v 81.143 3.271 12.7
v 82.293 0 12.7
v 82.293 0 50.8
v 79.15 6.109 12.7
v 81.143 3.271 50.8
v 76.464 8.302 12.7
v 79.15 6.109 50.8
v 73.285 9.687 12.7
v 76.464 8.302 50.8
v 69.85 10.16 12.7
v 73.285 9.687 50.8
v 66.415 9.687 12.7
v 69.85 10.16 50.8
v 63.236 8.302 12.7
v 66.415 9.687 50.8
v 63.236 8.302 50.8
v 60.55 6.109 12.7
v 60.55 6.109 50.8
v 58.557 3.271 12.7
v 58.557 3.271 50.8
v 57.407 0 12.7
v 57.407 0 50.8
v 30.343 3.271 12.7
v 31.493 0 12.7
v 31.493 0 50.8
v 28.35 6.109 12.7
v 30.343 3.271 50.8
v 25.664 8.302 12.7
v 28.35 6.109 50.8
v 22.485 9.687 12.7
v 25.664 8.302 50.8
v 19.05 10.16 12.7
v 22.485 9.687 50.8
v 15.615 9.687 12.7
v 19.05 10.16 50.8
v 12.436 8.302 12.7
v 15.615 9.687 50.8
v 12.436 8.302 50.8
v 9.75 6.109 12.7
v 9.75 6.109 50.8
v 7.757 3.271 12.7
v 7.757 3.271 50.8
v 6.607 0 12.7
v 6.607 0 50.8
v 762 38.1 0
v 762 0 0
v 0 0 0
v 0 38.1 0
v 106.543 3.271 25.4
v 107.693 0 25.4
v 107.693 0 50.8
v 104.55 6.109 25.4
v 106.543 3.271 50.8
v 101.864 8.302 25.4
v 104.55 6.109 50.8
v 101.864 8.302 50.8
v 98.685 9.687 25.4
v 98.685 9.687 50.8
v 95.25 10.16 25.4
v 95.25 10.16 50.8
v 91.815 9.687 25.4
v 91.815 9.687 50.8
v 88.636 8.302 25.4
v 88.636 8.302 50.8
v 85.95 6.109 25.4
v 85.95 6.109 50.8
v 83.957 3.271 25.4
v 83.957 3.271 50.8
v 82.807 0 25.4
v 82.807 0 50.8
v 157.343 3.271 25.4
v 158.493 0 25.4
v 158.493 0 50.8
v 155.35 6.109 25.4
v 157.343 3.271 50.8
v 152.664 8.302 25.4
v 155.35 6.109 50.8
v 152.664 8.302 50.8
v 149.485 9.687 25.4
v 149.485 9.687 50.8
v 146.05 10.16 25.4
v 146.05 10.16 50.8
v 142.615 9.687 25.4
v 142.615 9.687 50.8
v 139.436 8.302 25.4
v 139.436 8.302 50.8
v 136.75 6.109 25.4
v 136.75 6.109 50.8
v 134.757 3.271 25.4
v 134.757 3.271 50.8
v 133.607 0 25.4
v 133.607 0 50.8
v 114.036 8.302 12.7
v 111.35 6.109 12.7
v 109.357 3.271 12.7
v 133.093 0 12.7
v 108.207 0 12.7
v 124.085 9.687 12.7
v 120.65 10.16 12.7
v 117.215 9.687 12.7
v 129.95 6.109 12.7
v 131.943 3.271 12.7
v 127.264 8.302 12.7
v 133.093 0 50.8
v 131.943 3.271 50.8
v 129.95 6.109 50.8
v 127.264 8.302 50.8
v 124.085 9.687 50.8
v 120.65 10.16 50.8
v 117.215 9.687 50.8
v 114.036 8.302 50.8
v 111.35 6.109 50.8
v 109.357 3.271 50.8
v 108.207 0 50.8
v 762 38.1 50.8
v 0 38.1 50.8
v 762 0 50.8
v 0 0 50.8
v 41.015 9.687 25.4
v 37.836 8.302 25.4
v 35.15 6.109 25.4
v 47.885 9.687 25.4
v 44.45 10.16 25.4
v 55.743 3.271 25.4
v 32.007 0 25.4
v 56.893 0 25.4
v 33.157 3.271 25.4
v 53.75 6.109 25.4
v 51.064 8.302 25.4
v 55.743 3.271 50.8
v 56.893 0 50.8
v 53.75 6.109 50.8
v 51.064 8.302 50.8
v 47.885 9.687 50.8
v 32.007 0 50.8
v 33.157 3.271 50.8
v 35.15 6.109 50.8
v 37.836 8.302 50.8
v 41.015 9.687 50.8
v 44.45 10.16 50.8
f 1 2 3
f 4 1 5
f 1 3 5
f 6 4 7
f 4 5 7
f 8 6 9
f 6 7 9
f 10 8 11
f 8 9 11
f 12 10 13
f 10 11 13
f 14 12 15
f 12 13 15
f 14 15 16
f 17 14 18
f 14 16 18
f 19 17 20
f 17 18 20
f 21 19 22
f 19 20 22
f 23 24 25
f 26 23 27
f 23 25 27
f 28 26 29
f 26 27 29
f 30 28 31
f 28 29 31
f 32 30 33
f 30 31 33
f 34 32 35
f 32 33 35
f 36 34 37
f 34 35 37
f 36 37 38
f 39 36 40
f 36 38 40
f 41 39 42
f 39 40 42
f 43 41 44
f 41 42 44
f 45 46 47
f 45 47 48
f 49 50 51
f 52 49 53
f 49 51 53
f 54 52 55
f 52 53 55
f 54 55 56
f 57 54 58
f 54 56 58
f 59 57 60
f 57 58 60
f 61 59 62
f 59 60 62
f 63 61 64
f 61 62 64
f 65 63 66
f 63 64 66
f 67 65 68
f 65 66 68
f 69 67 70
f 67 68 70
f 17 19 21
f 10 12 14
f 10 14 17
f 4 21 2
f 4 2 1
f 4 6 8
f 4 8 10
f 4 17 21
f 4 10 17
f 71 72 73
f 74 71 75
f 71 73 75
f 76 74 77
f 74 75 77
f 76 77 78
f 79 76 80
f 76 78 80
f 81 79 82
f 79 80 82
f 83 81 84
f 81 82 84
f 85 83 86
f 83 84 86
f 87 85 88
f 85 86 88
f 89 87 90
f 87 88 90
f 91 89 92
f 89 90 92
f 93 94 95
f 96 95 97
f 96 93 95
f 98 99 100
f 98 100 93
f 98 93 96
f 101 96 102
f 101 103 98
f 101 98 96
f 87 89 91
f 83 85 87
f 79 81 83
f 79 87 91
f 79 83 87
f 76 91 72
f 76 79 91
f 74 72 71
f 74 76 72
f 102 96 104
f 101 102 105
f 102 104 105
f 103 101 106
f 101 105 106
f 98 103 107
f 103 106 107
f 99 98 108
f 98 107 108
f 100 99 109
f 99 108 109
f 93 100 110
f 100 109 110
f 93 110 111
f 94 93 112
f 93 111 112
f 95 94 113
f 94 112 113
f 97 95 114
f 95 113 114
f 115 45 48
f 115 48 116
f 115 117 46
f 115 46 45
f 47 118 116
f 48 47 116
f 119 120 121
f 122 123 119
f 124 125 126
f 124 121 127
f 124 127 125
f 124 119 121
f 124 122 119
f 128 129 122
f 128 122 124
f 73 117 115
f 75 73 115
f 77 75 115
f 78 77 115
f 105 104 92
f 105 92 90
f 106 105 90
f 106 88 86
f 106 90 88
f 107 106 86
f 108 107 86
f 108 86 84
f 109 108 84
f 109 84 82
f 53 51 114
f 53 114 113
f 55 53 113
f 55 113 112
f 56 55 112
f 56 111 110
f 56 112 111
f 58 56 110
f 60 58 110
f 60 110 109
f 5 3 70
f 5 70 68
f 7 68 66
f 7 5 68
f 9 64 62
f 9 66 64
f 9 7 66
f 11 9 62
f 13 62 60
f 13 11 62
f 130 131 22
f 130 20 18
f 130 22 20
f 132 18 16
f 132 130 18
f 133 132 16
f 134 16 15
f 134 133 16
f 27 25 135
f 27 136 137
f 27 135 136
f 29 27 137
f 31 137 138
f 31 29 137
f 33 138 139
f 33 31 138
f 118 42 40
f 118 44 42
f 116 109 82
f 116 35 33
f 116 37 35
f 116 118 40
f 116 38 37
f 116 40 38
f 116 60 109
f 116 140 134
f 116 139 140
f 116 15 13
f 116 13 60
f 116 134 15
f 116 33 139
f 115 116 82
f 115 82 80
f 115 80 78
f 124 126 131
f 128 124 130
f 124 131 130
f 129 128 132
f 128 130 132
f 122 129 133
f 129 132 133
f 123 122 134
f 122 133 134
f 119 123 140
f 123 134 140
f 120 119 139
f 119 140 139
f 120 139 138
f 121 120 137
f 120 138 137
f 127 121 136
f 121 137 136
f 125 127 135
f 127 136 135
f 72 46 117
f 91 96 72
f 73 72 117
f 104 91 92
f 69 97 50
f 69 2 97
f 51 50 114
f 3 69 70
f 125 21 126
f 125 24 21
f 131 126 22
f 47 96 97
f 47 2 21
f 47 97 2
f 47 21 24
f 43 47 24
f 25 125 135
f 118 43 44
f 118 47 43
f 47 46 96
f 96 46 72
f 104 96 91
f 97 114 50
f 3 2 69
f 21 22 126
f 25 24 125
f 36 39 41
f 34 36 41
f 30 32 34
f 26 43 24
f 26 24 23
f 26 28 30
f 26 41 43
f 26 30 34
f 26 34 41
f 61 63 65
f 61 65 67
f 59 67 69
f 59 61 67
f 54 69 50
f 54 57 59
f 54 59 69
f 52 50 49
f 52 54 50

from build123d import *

# Parameters (mm, degrees)
F0_W     = 38.1
F0_H     = 50.8
F1_DEPTH = 762
F3_DEPTH = 38.1
F5_DEPTH = 25.4


with BuildPart() as f1:
    # F0 (on Right) → F1 (new body)
    with BuildSketch(Plane.YZ):
        with Locations((19.05, 25.4)):
            Rectangle(F0_W, F0_H)
    extrude(amount=F1_DEPTH)

    # F2 (on face) → F3 (cut)
    with BuildSketch(Plane.XY.offset(50.8)):
        with BuildLine():
            ThreePointArc((6.35, -2.54), (19.05, -15.24), (31.75, -2.54))
            ThreePointArc((31.75, -2.54), (19.05, 10.16), (6.35, -2.54))
        make_face()
        with BuildLine():
            ThreePointArc((57.15, -2.54), (69.85, -15.24), (82.55, -2.54))
            ThreePointArc((82.55, -2.54), (69.85, 10.16), (57.15, -2.54))
        make_face()
        with BuildLine():
            ThreePointArc((107.95, -2.54), (120.65, -15.24), (133.35, -2.54))
            ThreePointArc((133.35, -2.54), (120.65, 10.16), (107.95, -2.54))
        make_face()
    extrude(amount=-F3_DEPTH, mode=Mode.SUBTRACT)

    # F4 (on face) → F5 (cut)
    with BuildSketch(Plane.XY.offset(50.8)):
        with BuildLine():
            ThreePointArc((31.75, -2.54), (44.45, -15.24), (57.15, -2.54))
            ThreePointArc((57.15, -2.54), (44.45, 10.16), (31.75, -2.54))
        make_face()
        with BuildLine():
            ThreePointArc((158.75, -2.54), (146.05, 10.16), (133.35, -2.54))
            ThreePointArc((133.35, -2.54), (146.05, -15.24), (158.75, -2.54))
        make_face()
        with BuildLine():
            ThreePointArc((107.95, -2.54), (95.25, 10.16), (82.55, -2.54))
            ThreePointArc((82.55, -2.54), (95.25, -15.24), (107.95, -2.54))
        make_face()
    extrude(amount=-F5_DEPTH, mode=Mode.SUBTRACT)


solid = f1.part
